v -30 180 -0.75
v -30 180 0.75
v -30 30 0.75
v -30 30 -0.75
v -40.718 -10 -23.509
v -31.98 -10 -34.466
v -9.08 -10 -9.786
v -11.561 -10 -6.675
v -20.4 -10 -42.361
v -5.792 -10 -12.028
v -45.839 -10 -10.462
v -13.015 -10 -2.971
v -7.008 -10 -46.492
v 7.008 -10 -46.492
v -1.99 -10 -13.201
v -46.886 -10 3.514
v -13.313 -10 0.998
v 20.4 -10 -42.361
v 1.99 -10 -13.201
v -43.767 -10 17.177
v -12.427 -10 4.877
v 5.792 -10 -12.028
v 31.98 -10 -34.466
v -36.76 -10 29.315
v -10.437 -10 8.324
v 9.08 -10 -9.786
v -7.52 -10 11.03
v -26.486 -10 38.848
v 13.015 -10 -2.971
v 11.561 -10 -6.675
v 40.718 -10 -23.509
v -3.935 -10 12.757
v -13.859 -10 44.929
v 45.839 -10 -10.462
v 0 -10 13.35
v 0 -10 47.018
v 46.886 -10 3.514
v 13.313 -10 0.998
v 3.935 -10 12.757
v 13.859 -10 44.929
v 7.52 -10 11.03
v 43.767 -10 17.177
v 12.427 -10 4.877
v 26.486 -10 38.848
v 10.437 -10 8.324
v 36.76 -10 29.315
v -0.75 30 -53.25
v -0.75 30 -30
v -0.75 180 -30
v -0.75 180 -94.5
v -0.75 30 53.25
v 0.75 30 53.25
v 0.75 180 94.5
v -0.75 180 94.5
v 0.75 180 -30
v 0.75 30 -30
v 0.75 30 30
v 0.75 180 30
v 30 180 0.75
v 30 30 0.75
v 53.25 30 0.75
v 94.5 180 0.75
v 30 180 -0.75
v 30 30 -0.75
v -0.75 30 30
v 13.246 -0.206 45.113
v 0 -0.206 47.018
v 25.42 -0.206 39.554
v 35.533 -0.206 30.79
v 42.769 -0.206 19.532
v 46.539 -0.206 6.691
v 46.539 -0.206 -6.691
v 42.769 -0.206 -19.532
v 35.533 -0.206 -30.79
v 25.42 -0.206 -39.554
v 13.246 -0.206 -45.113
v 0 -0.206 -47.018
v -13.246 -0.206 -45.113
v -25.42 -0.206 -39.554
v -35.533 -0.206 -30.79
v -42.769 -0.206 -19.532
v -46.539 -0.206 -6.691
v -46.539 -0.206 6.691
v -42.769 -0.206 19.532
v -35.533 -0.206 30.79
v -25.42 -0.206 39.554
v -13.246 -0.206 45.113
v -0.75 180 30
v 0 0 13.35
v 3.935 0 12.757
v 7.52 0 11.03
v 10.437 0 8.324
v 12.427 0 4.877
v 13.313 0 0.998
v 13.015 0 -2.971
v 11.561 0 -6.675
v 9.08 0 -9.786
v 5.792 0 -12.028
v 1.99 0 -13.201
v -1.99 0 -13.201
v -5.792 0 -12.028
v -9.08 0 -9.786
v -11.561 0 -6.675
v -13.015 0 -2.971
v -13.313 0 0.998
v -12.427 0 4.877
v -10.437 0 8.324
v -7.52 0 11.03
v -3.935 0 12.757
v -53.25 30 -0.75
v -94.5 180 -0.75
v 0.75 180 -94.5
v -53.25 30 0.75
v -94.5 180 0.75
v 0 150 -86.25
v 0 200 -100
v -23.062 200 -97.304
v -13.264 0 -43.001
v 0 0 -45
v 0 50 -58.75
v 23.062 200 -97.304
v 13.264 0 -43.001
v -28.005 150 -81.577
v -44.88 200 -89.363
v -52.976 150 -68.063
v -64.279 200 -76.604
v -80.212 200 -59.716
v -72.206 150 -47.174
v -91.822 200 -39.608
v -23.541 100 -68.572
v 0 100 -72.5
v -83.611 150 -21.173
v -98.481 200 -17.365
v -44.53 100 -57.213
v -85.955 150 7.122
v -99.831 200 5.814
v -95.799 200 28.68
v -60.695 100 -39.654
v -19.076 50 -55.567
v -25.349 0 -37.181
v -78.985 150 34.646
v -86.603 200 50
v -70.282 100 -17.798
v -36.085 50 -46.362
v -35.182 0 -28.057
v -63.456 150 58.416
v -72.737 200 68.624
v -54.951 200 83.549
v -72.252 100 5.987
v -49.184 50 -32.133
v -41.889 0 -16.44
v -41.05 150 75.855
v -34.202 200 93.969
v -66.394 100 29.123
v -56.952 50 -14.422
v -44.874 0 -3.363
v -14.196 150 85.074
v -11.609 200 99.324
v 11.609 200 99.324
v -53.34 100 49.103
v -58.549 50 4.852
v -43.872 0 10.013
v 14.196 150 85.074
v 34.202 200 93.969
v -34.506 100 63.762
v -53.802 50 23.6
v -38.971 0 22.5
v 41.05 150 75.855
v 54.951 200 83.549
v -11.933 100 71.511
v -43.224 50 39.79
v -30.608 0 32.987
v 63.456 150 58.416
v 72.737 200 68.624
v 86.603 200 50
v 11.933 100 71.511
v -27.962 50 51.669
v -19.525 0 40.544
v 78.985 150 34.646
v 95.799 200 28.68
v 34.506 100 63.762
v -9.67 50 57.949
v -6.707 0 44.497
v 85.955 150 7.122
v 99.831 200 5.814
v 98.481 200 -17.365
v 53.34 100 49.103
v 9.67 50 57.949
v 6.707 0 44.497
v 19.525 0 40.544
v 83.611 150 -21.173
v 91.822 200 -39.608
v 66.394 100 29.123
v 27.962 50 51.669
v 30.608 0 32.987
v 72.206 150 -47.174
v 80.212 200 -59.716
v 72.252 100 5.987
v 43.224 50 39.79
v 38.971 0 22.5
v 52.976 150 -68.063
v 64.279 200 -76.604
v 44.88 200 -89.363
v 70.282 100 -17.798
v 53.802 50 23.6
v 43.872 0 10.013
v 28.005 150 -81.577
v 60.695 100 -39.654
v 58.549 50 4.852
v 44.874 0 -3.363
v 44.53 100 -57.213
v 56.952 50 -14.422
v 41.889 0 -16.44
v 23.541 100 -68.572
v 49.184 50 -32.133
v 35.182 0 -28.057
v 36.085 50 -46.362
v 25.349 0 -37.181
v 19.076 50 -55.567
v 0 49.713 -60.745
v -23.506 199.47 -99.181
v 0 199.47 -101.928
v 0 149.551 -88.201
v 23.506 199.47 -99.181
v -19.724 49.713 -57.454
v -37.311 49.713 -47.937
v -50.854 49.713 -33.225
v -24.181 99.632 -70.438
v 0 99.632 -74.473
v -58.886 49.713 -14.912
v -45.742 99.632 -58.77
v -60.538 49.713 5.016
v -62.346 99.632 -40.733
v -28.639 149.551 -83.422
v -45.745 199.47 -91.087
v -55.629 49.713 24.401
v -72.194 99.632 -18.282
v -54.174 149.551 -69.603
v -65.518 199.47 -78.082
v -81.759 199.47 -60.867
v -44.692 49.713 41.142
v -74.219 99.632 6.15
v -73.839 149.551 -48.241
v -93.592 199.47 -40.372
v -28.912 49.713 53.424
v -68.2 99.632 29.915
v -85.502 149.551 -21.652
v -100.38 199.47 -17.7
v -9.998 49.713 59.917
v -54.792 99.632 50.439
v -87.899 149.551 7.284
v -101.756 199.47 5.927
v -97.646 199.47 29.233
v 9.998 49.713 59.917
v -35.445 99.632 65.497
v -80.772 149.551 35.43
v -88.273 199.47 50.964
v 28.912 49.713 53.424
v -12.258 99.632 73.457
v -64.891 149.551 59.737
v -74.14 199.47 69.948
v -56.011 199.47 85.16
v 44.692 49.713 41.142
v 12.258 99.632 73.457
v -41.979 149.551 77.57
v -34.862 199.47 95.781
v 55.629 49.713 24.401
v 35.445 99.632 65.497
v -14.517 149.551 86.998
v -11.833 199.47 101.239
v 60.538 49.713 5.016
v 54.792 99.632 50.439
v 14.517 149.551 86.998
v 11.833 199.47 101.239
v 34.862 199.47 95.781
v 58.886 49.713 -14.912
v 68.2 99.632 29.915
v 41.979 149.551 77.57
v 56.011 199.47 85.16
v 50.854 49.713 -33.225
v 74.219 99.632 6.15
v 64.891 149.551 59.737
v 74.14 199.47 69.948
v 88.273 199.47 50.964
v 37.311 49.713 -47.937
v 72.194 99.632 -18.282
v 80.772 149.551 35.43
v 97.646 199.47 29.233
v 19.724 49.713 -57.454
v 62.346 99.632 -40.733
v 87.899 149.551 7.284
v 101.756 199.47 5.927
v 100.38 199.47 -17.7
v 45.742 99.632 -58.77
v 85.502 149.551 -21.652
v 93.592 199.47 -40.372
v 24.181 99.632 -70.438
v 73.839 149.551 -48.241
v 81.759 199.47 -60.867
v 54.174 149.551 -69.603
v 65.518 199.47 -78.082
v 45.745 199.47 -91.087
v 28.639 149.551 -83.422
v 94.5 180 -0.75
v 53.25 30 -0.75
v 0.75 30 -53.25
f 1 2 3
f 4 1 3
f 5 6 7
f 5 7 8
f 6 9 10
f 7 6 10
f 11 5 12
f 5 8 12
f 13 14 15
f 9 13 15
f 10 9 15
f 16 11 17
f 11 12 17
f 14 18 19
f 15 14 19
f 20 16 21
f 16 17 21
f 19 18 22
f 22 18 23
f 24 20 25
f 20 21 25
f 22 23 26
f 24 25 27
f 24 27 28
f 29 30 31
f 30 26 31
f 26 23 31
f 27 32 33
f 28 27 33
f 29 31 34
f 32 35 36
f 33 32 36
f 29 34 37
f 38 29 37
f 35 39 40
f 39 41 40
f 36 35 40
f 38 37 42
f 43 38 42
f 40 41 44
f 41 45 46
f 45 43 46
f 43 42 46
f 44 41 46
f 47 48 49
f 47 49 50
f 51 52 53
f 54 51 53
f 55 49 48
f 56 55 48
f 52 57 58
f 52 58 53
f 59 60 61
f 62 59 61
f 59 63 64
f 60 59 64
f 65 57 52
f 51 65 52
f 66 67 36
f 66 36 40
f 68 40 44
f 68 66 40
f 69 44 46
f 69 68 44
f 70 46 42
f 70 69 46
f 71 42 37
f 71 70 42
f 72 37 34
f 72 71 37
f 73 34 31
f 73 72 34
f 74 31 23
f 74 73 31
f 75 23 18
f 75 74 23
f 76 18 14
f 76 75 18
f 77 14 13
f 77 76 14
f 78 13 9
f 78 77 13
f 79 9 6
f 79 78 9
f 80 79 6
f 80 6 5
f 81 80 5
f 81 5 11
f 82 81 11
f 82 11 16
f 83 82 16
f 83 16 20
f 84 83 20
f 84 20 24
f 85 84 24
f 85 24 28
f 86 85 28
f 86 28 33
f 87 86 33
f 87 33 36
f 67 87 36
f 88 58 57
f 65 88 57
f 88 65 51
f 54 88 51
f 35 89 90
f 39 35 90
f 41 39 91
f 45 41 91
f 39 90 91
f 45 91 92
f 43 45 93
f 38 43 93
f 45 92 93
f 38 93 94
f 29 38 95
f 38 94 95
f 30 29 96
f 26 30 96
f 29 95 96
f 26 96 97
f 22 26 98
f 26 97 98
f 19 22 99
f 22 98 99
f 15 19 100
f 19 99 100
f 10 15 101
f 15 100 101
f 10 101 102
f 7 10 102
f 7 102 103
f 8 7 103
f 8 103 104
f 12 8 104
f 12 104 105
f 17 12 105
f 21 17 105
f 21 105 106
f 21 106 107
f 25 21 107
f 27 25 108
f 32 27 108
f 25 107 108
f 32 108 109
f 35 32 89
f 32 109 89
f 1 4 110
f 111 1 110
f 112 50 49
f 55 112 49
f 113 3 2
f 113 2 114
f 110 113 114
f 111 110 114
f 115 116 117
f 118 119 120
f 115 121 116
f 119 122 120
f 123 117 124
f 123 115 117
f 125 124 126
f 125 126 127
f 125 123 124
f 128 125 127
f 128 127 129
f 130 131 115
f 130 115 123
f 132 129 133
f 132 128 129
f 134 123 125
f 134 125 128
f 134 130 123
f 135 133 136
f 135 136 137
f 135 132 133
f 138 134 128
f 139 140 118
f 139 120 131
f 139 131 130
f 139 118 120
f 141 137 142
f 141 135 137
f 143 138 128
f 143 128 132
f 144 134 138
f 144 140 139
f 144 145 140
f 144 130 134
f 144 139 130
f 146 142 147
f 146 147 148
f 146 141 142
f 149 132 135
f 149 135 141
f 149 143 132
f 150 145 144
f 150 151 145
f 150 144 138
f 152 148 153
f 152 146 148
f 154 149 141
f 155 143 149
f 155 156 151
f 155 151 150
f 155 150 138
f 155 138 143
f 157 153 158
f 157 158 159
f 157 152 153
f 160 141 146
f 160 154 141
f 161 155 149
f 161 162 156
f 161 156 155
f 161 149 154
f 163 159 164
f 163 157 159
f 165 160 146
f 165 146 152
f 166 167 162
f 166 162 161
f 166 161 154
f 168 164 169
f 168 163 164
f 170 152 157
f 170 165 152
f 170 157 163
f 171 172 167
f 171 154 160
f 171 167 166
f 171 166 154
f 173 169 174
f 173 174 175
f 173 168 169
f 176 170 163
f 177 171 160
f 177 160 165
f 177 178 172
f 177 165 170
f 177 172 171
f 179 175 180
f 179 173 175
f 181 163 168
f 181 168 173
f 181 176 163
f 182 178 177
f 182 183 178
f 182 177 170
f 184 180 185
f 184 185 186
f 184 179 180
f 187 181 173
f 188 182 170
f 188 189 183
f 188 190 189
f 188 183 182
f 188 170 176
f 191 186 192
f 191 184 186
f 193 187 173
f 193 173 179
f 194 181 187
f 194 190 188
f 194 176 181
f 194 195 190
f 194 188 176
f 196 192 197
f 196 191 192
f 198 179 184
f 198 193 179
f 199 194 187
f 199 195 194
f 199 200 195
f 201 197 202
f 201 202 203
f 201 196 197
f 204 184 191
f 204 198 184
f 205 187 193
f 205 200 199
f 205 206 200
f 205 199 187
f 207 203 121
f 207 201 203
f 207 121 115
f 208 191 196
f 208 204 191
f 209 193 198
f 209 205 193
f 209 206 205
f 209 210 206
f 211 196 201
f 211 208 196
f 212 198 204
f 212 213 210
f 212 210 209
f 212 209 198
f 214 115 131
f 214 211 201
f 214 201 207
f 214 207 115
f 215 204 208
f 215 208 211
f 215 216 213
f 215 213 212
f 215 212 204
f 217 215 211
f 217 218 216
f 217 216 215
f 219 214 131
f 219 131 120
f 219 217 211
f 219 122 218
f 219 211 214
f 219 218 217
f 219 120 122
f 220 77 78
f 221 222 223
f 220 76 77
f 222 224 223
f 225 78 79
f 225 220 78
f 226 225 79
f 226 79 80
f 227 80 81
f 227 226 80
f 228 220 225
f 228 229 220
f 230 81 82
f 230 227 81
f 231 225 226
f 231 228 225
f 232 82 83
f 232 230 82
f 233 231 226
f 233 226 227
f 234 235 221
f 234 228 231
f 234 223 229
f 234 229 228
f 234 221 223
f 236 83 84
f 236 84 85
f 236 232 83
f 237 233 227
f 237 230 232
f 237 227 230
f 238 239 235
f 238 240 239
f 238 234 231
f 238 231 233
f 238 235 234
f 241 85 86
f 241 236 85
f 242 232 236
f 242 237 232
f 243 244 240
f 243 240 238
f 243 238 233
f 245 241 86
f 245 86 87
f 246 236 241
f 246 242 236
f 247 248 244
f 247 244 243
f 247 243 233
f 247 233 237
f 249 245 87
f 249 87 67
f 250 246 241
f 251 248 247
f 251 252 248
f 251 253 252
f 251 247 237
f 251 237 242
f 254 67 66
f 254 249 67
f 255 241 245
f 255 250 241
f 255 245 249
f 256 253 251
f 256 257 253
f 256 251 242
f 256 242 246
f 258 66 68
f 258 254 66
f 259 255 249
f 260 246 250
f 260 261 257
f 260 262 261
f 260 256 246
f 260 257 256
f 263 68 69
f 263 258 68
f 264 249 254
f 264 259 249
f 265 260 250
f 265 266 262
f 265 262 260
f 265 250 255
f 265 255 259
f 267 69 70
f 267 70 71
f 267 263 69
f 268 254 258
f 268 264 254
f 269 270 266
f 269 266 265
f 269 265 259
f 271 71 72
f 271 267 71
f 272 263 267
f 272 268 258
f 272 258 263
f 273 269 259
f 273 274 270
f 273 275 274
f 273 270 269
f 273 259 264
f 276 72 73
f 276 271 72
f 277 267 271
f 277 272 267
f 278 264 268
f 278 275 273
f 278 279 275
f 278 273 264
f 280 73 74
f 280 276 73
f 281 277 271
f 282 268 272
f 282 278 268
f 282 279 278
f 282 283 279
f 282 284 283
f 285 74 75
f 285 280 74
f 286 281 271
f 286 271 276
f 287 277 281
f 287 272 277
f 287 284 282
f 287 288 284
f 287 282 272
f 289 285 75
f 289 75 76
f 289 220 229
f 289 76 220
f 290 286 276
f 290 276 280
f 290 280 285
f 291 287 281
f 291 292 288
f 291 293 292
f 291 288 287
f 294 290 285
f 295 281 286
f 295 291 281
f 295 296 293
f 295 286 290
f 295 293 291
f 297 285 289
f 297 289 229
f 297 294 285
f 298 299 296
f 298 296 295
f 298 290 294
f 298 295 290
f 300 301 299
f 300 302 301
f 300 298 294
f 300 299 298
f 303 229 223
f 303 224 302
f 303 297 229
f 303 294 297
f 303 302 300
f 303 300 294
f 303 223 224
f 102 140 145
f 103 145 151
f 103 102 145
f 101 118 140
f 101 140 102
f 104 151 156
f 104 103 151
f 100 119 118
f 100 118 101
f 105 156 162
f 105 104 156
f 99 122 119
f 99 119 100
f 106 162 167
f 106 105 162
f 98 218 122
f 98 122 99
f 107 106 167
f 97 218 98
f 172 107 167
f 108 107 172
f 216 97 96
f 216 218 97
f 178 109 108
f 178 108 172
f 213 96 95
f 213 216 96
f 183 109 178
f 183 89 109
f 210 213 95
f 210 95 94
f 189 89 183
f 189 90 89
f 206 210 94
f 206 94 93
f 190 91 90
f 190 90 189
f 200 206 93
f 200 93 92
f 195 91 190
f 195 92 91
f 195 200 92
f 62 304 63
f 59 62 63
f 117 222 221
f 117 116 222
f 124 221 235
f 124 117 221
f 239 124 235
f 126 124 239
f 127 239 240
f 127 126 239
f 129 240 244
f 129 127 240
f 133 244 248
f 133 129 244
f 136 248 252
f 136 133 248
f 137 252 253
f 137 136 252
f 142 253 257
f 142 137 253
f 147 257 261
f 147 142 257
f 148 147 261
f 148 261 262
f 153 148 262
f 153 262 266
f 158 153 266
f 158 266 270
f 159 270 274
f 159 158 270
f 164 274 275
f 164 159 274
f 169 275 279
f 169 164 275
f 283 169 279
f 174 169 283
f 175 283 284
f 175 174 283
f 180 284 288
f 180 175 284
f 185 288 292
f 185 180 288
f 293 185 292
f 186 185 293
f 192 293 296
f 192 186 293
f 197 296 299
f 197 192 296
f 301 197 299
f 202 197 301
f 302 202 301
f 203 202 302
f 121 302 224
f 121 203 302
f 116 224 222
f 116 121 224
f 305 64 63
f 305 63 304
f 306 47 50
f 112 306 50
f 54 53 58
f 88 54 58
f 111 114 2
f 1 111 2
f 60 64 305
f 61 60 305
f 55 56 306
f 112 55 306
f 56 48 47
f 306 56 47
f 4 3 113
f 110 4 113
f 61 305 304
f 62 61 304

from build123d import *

# Parameters (mm, degrees)
SKETCH2_R                = 47.017523695
SKETCH2_R_2              = 13.35
BOSS_EXTRUDE1_DEPTH      = 10
BOSS_EXTRUDE2_DEPTH      = 0.75
BOSS_EXTRUDE2_DEPTH_BACK = 0.75
CIRPATTERN3_COUNT        = 4


with BuildPart() as part:
    # Sketch1 → Revolve-Thin1 (revolve)
    with BuildSketch(Plane(origin=(0, 0, 0), x_dir=(0, 0, -1), z_dir=(1, 0, 0))):
        Polygon((100, 200), (45, 0), (46.928410786, -0.530312966), (101.928410786, 199.469687034), align=None)
    revolve(axis=Axis((0, 0, 0), (0, 1, 0)))

    # Sketch2 → Boss-Extrude1 (add)
    with BuildSketch(Plane(origin=(0, 0, 0), x_dir=(1, 0, 0), z_dir=(0, 1, 0))):
        Circle(SKETCH2_R)
        Circle(SKETCH2_R_2, mode=Mode.SUBTRACT)
    extrude(amount=-BOSS_EXTRUDE1_DEPTH)


with BuildPart() as body_2:
    # Sketch3 → Boss-Extrude2 (new, two sides: drawn at the far end of the back side and taken through both)
    with BuildSketch(Plane(origin=(0, 0, 0), x_dir=(0, 0, -1), z_dir=(1, 0, 0)).offset(-BOSS_EXTRUDE2_DEPTH_BACK)):
        Polygon((30, 180), (30, 30), (53.25, 30), (94.5, 180), align=None)
    extrude(amount=BOSS_EXTRUDE2_DEPTH + BOSS_EXTRUDE2_DEPTH_BACK)


with BuildPart() as cirpattern3_1:
    # CirPattern3: pattern copy
    add(body_2.part.rotate(Axis((0, 200, 0), (0, -1, 0)), 1 * 360 / CIRPATTERN3_COUNT))


with BuildPart() as cirpattern3_2:
    # CirPattern3: pattern copy
    add(body_2.part.rotate(Axis((0, 200, 0), (0, -1, 0)), 2 * 360 / CIRPATTERN3_COUNT))


with BuildPart() as cirpattern3_3:
    # CirPattern3: pattern copy
    add(body_2.part.rotate(Axis((0, 200, 0), (0, -1, 0)), 3 * 360 / CIRPATTERN3_COUNT))


solid = Compound([part.part, body_2.part, cirpattern3_1.part, cirpattern3_2.part, cirpattern3_3.part])
